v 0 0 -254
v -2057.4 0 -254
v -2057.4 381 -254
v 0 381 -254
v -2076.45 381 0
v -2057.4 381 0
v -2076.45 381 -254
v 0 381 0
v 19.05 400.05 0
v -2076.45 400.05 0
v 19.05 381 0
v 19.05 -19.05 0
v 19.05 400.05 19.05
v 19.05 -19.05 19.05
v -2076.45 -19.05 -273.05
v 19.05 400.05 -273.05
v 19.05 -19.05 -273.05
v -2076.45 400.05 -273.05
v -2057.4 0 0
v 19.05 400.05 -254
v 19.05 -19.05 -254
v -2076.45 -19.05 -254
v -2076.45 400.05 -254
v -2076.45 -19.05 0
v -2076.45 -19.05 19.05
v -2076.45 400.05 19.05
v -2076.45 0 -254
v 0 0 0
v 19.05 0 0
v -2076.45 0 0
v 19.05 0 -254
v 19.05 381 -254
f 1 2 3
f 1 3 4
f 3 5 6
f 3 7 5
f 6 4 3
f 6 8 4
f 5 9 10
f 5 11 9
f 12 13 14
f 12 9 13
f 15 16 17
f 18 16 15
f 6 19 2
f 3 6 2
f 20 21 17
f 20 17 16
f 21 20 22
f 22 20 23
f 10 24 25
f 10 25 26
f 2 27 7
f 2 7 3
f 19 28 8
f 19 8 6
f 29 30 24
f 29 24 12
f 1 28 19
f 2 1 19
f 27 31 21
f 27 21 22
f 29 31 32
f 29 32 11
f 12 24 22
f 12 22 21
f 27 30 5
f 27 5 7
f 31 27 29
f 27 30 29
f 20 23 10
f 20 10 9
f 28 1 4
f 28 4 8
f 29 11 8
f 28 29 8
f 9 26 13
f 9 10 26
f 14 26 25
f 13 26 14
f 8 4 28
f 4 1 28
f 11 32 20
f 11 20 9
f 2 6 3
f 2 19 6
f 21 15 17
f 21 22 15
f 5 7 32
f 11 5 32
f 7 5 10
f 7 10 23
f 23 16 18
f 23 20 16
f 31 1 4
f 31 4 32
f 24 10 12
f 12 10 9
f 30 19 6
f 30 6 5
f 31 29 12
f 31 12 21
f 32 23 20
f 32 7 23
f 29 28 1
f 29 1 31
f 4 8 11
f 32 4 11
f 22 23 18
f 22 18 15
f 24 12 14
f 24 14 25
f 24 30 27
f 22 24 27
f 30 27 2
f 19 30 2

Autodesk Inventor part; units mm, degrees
ref_plane "YZ Plane" through (0, 0, 0) normal (1, 0, 0) x (0, 1, 0)
ref_plane "XZ Plane" through (0, 0, 0) normal (0, 1, 0) x (-1, 0, 0)
ref_plane "XY Plane" through (0, 0, 0) normal (0, 0, 1) x (1, 0, 0)
sketch "Sketch1" plane through (0, 0, 0) normal (0, 1, 0) x (-1, 0, 0)
  line L0 (0, 0) -> (2057.4, 0)
  line L1 (2057.4, 0) -> (2057.4, -254)
  line L2 (2057.4, -254) -> (0, -254)
  line L3 (0, -254) -> (0, 0)
  dimension "d0" = 2057.4
  dimension "d1" = 254
extrude "Extrusion1" add sketch "Sketch1" along normal blind 381
sketch "Sketch2" plane through (0, 0, 0) normal (0, -1, 0) x (1, 0, 0)
  line L0 (0, 0) -> (0, -254) projected
  line L1 (0, -254) -> (-2057.4, -254) projected
  line L2 (-2057.4, -254) -> (-2057.4, 0) projected
  line L3 (-2057.4, 0) -> (0, 0) projected
  line L4 (-2057.4, 0) -> (0, 0) projected
  line L5 (0, 0) -> (19.05, 0)
  line L6 (19.05, 0) -> (19.05, -254)
  line L7 (19.05, -254) -> (0, -254)
  line L8 (0, -254) -> (0, 0)
  line L9 (-2057.4, 0) -> (-2076.45, 0)
  line L10 (-2076.45, 0) -> (-2076.45, -254)
  line L11 (-2076.45, -254) -> (-2057.4, -254)
  line L12 (-2057.4, -254) -> (-2057.4, 0)
  dimension "d4" = 19.05
  dimension "d5" = 19.05
  dimension "d6" = 0
extrude "Extrusion2" add sketch "Sketch2" along normal blind 19.05 separate body
sketch "Sketch3" plane through (0, 0, 0) normal (0, 1, 0) x (1, 0, 0)
  line L0 (0, 254) -> (0, 0) projected
  line L1 (0, 0) -> (-2057.4, 0) projected
  line L2 (-2057.4, 0) -> (-2057.4, 254) projected
  line L3 (-2057.4, 254) -> (0, 254) projected
  line L4 (19.05, 0) -> (-2076.45, 0) projected
  line L5 (-2076.45, 0) -> (-2076.45, 254) projected
  line L6 (-2076.45, 254) -> (19.05, 254) projected
  line L7 (19.05, 254) -> (19.05, 0) projected
extrude "Extrusion3" add sketch "Sketch3" along normal up to surface (381 mm away) separate body contours L6 L7 L4 L0 | L2 L4 L5 L6
sketch "Sketch4" plane through (0, 381, 0) normal (0, 1, 0) x (1, 0, 0)
  line L0 (0, 254) -> (0, 0) projected
  line L1 (0, 0) -> (-2057.4, 0) projected
  line L2 (-2057.4, 0) -> (-2057.4, 254) projected
  line L3 (-2057.4, 254) -> (0, 254) projected
  line L4 (-2057.4, 254) -> (-2057.4, 0) projected
  line L5 (-2057.4, 0) -> (-2076.45, 0) projected
  line L6 (-2076.45, 0) -> (-2076.45, 254) projected
  line L7 (-2076.45, 254) -> (-2057.4, 254) projected
  line L8 (19.05, 254) -> (19.05, 0) projected
  line L9 (19.05, 0) -> (0, 0) projected
  line L10 (0, 0) -> (0, 254) projected
  line L11 (0, 254) -> (19.05, 254) projected
extrude "Extrusion4" add sketch "Sketch4" along normal blind 19.05 separate body
sketch "Sketch5" plane through (-2057.4, 0, 0) normal (0, 0, 1) x (1, 0, 0)
  line L0 (2057.4, 381) -> (2057.4, 0) projected
  line L1 (2057.4, 0) -> (0, 0) projected
  line L2 (0, 0) -> (0, 381) projected
  line L3 (0, 381) -> (2057.4, 381) projected
  line L4 (-19.05, 0) -> (2076.45, 0) projected
  line L5 (2076.45, 0) -> (2076.45, -19.05) projected
  line L6 (2076.45, -19.05) -> (-19.05, -19.05) projected
  line L7 (-19.05, -19.05) -> (-19.05, 0) projected
  line L8 (0, 381) -> (0, 0) projected
  line L9 (0, 0) -> (-19.05, 0) projected
  line L10 (-19.05, 0) -> (-19.05, 381) projected
  line L11 (-19.05, 381) -> (0, 381) projected
  line L12 (2076.45, 0) -> (2057.4, 0) projected
  line L13 (2057.4, 0) -> (2057.4, 381) projected
  line L14 (2057.4, 381) -> (2076.45, 381) projected
  line L15 (2076.45, 381) -> (2076.45, 0) projected
  line L16 (2076.45, 400.05) -> (2076.45, 381) projected
  line L17 (2076.45, 381) -> (-19.05, 381) projected
  line L18 (-19.05, 381) -> (-19.05, 400.05) projected
  line L19 (-19.05, 400.05) -> (2076.45, 400.05) projected
extrude "Extrusion5" add sketch "Sketch5" along normal blind 19.05 separate body
sketch "Sketch6" plane through (0, 0, -254) normal (0, 0, -1) x (-1, 0, 0)
  line L0 (2057.4, 381) -> (2057.4, 0) projected
  line L1 (2057.4, 0) -> (0, 0) projected
  line L2 (0, 0) -> (0, 381) projected
  line L3 (0, 381) -> (2057.4, 381) projected
  line L4 (-19.05, -19.05) -> (-19.05, 0) projected
  line L5 (-19.05, 0) -> (2076.45, 0) projected
  line L6 (2076.45, 0) -> (2076.45, -19.05) projected
  line L7 (2076.45, -19.05) -> (-19.05, -19.05) projected
  line L8 (2076.45, 381) -> (2076.45, 0) projected
  line L9 (2076.45, 0) -> (2057.4, 0) projected
  line L10 (2057.4, 0) -> (2057.4, 381) projected
  line L11 (2057.4, 381) -> (2076.45, 381) projected
  line L12 (0, 0) -> (-19.05, 0) projected
  line L13 (-19.05, 0) -> (-19.05, 381) projected
  line L14 (-19.05, 381) -> (0, 381) projected
  line L15 (0, 381) -> (0, 0) projected
  line L16 (2076.45, 381) -> (-19.05, 381) projected
  line L17 (-19.05, 381) -> (-19.05, 400.05) projected
  line L18 (-19.05, 400.05) -> (2076.45, 400.05) projected
  line L19 (2076.45, 400.05) -> (2076.45, 381) projected
extrude "Extrusion6" add sketch "Sketch6" along normal blind 19.05 separate body
properties part number "0.75 box for battery pack"
